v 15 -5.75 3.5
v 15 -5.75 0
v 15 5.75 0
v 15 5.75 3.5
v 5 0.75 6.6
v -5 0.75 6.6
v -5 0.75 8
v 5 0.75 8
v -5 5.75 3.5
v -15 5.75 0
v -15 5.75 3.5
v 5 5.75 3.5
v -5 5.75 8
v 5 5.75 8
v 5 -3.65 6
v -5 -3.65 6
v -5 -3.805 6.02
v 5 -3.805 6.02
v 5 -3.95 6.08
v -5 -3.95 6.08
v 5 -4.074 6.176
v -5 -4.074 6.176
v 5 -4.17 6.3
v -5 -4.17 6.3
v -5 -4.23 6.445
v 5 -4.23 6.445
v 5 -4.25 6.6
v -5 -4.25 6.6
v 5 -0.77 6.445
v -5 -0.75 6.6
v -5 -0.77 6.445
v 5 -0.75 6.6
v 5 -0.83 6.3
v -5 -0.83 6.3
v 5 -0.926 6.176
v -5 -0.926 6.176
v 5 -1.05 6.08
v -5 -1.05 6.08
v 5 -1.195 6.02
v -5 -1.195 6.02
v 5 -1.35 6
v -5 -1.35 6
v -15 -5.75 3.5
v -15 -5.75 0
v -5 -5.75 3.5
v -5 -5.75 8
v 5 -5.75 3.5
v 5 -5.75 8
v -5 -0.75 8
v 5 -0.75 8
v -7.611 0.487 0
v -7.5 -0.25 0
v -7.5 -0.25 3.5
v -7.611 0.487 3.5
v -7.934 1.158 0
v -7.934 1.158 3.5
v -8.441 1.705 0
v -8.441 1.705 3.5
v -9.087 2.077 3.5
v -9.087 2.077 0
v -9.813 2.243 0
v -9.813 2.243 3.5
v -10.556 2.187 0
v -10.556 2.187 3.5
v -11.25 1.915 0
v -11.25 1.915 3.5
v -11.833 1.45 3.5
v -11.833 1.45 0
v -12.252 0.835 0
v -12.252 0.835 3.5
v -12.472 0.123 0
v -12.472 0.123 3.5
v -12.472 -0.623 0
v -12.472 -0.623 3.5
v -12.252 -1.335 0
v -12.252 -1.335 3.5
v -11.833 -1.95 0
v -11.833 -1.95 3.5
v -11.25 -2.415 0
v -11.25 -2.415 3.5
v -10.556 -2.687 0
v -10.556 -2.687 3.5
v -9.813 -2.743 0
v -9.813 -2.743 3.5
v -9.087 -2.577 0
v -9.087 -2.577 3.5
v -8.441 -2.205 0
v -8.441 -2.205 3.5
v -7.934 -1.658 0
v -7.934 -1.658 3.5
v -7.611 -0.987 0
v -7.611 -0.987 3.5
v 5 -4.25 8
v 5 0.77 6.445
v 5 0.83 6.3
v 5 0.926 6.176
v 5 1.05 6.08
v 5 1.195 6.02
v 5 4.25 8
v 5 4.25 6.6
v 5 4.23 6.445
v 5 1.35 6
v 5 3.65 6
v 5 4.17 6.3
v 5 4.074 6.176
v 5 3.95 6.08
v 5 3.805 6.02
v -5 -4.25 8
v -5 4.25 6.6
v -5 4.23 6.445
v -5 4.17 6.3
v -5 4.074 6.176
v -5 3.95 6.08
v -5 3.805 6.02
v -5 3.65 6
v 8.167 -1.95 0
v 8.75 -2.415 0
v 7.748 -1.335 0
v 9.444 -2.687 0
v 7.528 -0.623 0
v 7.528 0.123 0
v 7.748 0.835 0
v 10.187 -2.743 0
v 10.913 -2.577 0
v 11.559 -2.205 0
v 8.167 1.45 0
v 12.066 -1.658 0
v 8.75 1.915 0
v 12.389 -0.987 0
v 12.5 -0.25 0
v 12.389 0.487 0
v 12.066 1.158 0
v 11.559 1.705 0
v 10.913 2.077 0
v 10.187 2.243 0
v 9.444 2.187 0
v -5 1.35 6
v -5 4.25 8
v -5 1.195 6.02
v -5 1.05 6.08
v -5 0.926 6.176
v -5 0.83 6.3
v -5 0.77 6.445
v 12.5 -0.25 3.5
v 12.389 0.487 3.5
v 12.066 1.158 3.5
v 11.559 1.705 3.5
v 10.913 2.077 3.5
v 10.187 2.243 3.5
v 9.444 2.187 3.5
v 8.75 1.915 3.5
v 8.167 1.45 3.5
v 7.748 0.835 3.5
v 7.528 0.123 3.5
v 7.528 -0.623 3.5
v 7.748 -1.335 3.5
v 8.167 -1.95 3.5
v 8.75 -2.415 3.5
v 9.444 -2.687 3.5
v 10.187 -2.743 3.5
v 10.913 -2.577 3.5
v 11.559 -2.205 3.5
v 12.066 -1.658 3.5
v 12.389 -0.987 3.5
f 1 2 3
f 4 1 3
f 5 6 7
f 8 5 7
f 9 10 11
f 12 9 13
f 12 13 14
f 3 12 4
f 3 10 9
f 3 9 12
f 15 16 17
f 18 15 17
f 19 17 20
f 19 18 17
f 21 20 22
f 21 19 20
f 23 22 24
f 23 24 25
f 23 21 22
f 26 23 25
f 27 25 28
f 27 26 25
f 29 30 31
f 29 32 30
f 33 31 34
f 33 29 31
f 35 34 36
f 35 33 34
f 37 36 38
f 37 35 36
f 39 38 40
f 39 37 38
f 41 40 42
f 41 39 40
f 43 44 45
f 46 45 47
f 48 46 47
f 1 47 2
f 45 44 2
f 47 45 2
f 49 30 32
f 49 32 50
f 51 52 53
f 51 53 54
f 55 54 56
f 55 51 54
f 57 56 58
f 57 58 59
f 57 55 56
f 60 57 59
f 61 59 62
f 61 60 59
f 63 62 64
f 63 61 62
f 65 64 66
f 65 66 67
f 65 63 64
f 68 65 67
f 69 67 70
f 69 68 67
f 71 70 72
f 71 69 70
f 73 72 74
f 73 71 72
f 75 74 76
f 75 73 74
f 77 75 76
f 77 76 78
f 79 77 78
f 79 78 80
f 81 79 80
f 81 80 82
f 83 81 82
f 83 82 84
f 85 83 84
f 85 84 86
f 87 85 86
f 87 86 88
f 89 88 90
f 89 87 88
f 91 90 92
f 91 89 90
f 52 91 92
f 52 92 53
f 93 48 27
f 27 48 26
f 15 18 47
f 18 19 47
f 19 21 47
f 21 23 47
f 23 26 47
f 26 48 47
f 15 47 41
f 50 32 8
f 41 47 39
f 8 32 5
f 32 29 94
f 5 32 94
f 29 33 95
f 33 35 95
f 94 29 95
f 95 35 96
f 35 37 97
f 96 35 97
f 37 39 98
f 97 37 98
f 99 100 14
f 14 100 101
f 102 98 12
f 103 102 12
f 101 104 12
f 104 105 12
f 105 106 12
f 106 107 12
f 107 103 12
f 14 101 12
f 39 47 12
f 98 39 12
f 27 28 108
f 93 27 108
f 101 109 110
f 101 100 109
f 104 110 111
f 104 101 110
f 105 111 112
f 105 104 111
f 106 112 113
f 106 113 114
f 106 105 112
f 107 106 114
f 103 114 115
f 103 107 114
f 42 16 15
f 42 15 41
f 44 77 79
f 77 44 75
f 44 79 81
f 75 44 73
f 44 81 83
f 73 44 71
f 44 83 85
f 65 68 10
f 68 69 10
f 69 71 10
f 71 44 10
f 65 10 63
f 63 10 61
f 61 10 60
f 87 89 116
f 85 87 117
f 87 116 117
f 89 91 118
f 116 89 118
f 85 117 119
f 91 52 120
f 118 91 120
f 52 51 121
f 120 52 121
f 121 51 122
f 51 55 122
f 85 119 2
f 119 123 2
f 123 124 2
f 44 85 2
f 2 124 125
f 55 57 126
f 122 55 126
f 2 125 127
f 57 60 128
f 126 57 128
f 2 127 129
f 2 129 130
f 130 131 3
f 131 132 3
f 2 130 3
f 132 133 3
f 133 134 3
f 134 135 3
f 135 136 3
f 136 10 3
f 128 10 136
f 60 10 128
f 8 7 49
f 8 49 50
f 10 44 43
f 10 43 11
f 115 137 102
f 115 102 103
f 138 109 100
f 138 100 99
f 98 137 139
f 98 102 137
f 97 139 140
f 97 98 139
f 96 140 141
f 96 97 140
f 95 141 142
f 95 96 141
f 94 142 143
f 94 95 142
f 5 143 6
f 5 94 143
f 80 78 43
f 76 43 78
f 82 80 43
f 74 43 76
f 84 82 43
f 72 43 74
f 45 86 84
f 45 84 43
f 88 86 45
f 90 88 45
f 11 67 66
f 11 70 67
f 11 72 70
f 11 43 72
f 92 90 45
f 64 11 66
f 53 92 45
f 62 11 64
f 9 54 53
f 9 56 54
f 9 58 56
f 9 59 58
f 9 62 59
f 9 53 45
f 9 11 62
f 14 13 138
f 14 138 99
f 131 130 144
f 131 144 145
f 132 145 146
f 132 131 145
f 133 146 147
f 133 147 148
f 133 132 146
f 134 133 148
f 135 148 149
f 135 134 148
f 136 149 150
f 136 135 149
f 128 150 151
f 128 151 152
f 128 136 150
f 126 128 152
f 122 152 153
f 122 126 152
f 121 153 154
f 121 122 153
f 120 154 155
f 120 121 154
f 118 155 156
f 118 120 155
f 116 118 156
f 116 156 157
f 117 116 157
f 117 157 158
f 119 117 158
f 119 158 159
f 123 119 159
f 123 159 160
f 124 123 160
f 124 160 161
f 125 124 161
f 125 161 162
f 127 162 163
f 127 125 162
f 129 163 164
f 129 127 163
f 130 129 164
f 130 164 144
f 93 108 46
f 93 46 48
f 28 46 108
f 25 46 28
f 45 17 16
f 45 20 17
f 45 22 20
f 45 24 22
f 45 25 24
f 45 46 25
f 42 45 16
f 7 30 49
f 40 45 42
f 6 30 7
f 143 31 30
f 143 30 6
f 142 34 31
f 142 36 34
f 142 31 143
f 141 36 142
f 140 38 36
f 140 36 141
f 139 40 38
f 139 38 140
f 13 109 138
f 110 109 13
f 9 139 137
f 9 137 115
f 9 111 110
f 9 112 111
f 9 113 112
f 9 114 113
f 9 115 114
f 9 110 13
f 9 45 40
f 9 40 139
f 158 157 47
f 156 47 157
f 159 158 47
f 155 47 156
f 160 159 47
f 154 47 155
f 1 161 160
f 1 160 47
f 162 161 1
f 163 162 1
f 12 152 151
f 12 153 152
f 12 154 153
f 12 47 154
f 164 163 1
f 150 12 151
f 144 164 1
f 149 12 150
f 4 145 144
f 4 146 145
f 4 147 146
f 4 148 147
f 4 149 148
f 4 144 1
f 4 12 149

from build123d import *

# Parameters (mm, degrees)
SKETCH1_W              = 30
SKETCH1_H              = 11.5
SKETCH1_R              = 2.5
BOSS_EXTRUDE1_DEPTH    = 3.5
SKETCH2_W              = 10
SKETCH2_H              = 11.5
BOSS_EXTRUDE2_DEPTH    = 4.5
SKETCH3_W              = 2
SKETCH3_H              = 3.5
CUT_EXTRUDE1_DEPTH     = 23.29489852
FILLET1_R              = 0.6
LPATTERN1_COUNT        = 2
LPATTERN1_PITCH        = 5
FILLET1_OF_LPATTERN1_R = 0.6


with BuildPart() as part:
    # Sketch1 → Boss-Extrude1 (new body)
    with BuildSketch(Plane.XY):
        Rectangle(SKETCH1_W, SKETCH1_H)
        with Locations((-10, -0.25)):
            Circle(SKETCH1_R, mode=Mode.SUBTRACT)
        with Locations((10, -0.25)):
            Circle(SKETCH1_R, mode=Mode.SUBTRACT)
    extrude(amount=BOSS_EXTRUDE1_DEPTH)

    # Sketch2 → Boss-Extrude2 (add)
    with BuildSketch(Plane.XY.offset(3.5)):
        Rectangle(SKETCH2_W, SKETCH2_H)
    extrude(amount=BOSS_EXTRUDE2_DEPTH)

    # Sketch3 → Cut-Extrude1 (cut, through all)
    with BuildSketch(Plane.ZY.offset(5)):
        with Locations((7, 2.5)):
            Rectangle(SKETCH3_W, SKETCH3_H)
    cut_extrude1 = extrude(amount=-CUT_EXTRUDE1_DEPTH, mode=Mode.SUBTRACT)

    # Fillet1
    fillet1_edges = [part.edges().sort_by_distance(p)[0] for p in [
        (0, 0.75, 6),
        (0, 4.25, 6),
    ]]
    fillet(fillet1_edges, radius=FILLET1_R)

    # LPattern1: Cut-Extrude1 ×2
    with Locations(*[(0, -i * LPATTERN1_PITCH, 0) for i in range(1, LPATTERN1_COUNT)]):
        add(cut_extrude1, mode=Mode.SUBTRACT)

    # Fillet1 of LPattern1
    fillet1_of_lpattern1_edges = [part.edges().sort_by_distance(p)[0] for p in [
        (0, -4.25, 6),
        (0, -0.75, 6),
    ]]
    fillet(fillet1_of_lpattern1_edges, radius=FILLET1_OF_LPATTERN1_R)


solid = part.part
